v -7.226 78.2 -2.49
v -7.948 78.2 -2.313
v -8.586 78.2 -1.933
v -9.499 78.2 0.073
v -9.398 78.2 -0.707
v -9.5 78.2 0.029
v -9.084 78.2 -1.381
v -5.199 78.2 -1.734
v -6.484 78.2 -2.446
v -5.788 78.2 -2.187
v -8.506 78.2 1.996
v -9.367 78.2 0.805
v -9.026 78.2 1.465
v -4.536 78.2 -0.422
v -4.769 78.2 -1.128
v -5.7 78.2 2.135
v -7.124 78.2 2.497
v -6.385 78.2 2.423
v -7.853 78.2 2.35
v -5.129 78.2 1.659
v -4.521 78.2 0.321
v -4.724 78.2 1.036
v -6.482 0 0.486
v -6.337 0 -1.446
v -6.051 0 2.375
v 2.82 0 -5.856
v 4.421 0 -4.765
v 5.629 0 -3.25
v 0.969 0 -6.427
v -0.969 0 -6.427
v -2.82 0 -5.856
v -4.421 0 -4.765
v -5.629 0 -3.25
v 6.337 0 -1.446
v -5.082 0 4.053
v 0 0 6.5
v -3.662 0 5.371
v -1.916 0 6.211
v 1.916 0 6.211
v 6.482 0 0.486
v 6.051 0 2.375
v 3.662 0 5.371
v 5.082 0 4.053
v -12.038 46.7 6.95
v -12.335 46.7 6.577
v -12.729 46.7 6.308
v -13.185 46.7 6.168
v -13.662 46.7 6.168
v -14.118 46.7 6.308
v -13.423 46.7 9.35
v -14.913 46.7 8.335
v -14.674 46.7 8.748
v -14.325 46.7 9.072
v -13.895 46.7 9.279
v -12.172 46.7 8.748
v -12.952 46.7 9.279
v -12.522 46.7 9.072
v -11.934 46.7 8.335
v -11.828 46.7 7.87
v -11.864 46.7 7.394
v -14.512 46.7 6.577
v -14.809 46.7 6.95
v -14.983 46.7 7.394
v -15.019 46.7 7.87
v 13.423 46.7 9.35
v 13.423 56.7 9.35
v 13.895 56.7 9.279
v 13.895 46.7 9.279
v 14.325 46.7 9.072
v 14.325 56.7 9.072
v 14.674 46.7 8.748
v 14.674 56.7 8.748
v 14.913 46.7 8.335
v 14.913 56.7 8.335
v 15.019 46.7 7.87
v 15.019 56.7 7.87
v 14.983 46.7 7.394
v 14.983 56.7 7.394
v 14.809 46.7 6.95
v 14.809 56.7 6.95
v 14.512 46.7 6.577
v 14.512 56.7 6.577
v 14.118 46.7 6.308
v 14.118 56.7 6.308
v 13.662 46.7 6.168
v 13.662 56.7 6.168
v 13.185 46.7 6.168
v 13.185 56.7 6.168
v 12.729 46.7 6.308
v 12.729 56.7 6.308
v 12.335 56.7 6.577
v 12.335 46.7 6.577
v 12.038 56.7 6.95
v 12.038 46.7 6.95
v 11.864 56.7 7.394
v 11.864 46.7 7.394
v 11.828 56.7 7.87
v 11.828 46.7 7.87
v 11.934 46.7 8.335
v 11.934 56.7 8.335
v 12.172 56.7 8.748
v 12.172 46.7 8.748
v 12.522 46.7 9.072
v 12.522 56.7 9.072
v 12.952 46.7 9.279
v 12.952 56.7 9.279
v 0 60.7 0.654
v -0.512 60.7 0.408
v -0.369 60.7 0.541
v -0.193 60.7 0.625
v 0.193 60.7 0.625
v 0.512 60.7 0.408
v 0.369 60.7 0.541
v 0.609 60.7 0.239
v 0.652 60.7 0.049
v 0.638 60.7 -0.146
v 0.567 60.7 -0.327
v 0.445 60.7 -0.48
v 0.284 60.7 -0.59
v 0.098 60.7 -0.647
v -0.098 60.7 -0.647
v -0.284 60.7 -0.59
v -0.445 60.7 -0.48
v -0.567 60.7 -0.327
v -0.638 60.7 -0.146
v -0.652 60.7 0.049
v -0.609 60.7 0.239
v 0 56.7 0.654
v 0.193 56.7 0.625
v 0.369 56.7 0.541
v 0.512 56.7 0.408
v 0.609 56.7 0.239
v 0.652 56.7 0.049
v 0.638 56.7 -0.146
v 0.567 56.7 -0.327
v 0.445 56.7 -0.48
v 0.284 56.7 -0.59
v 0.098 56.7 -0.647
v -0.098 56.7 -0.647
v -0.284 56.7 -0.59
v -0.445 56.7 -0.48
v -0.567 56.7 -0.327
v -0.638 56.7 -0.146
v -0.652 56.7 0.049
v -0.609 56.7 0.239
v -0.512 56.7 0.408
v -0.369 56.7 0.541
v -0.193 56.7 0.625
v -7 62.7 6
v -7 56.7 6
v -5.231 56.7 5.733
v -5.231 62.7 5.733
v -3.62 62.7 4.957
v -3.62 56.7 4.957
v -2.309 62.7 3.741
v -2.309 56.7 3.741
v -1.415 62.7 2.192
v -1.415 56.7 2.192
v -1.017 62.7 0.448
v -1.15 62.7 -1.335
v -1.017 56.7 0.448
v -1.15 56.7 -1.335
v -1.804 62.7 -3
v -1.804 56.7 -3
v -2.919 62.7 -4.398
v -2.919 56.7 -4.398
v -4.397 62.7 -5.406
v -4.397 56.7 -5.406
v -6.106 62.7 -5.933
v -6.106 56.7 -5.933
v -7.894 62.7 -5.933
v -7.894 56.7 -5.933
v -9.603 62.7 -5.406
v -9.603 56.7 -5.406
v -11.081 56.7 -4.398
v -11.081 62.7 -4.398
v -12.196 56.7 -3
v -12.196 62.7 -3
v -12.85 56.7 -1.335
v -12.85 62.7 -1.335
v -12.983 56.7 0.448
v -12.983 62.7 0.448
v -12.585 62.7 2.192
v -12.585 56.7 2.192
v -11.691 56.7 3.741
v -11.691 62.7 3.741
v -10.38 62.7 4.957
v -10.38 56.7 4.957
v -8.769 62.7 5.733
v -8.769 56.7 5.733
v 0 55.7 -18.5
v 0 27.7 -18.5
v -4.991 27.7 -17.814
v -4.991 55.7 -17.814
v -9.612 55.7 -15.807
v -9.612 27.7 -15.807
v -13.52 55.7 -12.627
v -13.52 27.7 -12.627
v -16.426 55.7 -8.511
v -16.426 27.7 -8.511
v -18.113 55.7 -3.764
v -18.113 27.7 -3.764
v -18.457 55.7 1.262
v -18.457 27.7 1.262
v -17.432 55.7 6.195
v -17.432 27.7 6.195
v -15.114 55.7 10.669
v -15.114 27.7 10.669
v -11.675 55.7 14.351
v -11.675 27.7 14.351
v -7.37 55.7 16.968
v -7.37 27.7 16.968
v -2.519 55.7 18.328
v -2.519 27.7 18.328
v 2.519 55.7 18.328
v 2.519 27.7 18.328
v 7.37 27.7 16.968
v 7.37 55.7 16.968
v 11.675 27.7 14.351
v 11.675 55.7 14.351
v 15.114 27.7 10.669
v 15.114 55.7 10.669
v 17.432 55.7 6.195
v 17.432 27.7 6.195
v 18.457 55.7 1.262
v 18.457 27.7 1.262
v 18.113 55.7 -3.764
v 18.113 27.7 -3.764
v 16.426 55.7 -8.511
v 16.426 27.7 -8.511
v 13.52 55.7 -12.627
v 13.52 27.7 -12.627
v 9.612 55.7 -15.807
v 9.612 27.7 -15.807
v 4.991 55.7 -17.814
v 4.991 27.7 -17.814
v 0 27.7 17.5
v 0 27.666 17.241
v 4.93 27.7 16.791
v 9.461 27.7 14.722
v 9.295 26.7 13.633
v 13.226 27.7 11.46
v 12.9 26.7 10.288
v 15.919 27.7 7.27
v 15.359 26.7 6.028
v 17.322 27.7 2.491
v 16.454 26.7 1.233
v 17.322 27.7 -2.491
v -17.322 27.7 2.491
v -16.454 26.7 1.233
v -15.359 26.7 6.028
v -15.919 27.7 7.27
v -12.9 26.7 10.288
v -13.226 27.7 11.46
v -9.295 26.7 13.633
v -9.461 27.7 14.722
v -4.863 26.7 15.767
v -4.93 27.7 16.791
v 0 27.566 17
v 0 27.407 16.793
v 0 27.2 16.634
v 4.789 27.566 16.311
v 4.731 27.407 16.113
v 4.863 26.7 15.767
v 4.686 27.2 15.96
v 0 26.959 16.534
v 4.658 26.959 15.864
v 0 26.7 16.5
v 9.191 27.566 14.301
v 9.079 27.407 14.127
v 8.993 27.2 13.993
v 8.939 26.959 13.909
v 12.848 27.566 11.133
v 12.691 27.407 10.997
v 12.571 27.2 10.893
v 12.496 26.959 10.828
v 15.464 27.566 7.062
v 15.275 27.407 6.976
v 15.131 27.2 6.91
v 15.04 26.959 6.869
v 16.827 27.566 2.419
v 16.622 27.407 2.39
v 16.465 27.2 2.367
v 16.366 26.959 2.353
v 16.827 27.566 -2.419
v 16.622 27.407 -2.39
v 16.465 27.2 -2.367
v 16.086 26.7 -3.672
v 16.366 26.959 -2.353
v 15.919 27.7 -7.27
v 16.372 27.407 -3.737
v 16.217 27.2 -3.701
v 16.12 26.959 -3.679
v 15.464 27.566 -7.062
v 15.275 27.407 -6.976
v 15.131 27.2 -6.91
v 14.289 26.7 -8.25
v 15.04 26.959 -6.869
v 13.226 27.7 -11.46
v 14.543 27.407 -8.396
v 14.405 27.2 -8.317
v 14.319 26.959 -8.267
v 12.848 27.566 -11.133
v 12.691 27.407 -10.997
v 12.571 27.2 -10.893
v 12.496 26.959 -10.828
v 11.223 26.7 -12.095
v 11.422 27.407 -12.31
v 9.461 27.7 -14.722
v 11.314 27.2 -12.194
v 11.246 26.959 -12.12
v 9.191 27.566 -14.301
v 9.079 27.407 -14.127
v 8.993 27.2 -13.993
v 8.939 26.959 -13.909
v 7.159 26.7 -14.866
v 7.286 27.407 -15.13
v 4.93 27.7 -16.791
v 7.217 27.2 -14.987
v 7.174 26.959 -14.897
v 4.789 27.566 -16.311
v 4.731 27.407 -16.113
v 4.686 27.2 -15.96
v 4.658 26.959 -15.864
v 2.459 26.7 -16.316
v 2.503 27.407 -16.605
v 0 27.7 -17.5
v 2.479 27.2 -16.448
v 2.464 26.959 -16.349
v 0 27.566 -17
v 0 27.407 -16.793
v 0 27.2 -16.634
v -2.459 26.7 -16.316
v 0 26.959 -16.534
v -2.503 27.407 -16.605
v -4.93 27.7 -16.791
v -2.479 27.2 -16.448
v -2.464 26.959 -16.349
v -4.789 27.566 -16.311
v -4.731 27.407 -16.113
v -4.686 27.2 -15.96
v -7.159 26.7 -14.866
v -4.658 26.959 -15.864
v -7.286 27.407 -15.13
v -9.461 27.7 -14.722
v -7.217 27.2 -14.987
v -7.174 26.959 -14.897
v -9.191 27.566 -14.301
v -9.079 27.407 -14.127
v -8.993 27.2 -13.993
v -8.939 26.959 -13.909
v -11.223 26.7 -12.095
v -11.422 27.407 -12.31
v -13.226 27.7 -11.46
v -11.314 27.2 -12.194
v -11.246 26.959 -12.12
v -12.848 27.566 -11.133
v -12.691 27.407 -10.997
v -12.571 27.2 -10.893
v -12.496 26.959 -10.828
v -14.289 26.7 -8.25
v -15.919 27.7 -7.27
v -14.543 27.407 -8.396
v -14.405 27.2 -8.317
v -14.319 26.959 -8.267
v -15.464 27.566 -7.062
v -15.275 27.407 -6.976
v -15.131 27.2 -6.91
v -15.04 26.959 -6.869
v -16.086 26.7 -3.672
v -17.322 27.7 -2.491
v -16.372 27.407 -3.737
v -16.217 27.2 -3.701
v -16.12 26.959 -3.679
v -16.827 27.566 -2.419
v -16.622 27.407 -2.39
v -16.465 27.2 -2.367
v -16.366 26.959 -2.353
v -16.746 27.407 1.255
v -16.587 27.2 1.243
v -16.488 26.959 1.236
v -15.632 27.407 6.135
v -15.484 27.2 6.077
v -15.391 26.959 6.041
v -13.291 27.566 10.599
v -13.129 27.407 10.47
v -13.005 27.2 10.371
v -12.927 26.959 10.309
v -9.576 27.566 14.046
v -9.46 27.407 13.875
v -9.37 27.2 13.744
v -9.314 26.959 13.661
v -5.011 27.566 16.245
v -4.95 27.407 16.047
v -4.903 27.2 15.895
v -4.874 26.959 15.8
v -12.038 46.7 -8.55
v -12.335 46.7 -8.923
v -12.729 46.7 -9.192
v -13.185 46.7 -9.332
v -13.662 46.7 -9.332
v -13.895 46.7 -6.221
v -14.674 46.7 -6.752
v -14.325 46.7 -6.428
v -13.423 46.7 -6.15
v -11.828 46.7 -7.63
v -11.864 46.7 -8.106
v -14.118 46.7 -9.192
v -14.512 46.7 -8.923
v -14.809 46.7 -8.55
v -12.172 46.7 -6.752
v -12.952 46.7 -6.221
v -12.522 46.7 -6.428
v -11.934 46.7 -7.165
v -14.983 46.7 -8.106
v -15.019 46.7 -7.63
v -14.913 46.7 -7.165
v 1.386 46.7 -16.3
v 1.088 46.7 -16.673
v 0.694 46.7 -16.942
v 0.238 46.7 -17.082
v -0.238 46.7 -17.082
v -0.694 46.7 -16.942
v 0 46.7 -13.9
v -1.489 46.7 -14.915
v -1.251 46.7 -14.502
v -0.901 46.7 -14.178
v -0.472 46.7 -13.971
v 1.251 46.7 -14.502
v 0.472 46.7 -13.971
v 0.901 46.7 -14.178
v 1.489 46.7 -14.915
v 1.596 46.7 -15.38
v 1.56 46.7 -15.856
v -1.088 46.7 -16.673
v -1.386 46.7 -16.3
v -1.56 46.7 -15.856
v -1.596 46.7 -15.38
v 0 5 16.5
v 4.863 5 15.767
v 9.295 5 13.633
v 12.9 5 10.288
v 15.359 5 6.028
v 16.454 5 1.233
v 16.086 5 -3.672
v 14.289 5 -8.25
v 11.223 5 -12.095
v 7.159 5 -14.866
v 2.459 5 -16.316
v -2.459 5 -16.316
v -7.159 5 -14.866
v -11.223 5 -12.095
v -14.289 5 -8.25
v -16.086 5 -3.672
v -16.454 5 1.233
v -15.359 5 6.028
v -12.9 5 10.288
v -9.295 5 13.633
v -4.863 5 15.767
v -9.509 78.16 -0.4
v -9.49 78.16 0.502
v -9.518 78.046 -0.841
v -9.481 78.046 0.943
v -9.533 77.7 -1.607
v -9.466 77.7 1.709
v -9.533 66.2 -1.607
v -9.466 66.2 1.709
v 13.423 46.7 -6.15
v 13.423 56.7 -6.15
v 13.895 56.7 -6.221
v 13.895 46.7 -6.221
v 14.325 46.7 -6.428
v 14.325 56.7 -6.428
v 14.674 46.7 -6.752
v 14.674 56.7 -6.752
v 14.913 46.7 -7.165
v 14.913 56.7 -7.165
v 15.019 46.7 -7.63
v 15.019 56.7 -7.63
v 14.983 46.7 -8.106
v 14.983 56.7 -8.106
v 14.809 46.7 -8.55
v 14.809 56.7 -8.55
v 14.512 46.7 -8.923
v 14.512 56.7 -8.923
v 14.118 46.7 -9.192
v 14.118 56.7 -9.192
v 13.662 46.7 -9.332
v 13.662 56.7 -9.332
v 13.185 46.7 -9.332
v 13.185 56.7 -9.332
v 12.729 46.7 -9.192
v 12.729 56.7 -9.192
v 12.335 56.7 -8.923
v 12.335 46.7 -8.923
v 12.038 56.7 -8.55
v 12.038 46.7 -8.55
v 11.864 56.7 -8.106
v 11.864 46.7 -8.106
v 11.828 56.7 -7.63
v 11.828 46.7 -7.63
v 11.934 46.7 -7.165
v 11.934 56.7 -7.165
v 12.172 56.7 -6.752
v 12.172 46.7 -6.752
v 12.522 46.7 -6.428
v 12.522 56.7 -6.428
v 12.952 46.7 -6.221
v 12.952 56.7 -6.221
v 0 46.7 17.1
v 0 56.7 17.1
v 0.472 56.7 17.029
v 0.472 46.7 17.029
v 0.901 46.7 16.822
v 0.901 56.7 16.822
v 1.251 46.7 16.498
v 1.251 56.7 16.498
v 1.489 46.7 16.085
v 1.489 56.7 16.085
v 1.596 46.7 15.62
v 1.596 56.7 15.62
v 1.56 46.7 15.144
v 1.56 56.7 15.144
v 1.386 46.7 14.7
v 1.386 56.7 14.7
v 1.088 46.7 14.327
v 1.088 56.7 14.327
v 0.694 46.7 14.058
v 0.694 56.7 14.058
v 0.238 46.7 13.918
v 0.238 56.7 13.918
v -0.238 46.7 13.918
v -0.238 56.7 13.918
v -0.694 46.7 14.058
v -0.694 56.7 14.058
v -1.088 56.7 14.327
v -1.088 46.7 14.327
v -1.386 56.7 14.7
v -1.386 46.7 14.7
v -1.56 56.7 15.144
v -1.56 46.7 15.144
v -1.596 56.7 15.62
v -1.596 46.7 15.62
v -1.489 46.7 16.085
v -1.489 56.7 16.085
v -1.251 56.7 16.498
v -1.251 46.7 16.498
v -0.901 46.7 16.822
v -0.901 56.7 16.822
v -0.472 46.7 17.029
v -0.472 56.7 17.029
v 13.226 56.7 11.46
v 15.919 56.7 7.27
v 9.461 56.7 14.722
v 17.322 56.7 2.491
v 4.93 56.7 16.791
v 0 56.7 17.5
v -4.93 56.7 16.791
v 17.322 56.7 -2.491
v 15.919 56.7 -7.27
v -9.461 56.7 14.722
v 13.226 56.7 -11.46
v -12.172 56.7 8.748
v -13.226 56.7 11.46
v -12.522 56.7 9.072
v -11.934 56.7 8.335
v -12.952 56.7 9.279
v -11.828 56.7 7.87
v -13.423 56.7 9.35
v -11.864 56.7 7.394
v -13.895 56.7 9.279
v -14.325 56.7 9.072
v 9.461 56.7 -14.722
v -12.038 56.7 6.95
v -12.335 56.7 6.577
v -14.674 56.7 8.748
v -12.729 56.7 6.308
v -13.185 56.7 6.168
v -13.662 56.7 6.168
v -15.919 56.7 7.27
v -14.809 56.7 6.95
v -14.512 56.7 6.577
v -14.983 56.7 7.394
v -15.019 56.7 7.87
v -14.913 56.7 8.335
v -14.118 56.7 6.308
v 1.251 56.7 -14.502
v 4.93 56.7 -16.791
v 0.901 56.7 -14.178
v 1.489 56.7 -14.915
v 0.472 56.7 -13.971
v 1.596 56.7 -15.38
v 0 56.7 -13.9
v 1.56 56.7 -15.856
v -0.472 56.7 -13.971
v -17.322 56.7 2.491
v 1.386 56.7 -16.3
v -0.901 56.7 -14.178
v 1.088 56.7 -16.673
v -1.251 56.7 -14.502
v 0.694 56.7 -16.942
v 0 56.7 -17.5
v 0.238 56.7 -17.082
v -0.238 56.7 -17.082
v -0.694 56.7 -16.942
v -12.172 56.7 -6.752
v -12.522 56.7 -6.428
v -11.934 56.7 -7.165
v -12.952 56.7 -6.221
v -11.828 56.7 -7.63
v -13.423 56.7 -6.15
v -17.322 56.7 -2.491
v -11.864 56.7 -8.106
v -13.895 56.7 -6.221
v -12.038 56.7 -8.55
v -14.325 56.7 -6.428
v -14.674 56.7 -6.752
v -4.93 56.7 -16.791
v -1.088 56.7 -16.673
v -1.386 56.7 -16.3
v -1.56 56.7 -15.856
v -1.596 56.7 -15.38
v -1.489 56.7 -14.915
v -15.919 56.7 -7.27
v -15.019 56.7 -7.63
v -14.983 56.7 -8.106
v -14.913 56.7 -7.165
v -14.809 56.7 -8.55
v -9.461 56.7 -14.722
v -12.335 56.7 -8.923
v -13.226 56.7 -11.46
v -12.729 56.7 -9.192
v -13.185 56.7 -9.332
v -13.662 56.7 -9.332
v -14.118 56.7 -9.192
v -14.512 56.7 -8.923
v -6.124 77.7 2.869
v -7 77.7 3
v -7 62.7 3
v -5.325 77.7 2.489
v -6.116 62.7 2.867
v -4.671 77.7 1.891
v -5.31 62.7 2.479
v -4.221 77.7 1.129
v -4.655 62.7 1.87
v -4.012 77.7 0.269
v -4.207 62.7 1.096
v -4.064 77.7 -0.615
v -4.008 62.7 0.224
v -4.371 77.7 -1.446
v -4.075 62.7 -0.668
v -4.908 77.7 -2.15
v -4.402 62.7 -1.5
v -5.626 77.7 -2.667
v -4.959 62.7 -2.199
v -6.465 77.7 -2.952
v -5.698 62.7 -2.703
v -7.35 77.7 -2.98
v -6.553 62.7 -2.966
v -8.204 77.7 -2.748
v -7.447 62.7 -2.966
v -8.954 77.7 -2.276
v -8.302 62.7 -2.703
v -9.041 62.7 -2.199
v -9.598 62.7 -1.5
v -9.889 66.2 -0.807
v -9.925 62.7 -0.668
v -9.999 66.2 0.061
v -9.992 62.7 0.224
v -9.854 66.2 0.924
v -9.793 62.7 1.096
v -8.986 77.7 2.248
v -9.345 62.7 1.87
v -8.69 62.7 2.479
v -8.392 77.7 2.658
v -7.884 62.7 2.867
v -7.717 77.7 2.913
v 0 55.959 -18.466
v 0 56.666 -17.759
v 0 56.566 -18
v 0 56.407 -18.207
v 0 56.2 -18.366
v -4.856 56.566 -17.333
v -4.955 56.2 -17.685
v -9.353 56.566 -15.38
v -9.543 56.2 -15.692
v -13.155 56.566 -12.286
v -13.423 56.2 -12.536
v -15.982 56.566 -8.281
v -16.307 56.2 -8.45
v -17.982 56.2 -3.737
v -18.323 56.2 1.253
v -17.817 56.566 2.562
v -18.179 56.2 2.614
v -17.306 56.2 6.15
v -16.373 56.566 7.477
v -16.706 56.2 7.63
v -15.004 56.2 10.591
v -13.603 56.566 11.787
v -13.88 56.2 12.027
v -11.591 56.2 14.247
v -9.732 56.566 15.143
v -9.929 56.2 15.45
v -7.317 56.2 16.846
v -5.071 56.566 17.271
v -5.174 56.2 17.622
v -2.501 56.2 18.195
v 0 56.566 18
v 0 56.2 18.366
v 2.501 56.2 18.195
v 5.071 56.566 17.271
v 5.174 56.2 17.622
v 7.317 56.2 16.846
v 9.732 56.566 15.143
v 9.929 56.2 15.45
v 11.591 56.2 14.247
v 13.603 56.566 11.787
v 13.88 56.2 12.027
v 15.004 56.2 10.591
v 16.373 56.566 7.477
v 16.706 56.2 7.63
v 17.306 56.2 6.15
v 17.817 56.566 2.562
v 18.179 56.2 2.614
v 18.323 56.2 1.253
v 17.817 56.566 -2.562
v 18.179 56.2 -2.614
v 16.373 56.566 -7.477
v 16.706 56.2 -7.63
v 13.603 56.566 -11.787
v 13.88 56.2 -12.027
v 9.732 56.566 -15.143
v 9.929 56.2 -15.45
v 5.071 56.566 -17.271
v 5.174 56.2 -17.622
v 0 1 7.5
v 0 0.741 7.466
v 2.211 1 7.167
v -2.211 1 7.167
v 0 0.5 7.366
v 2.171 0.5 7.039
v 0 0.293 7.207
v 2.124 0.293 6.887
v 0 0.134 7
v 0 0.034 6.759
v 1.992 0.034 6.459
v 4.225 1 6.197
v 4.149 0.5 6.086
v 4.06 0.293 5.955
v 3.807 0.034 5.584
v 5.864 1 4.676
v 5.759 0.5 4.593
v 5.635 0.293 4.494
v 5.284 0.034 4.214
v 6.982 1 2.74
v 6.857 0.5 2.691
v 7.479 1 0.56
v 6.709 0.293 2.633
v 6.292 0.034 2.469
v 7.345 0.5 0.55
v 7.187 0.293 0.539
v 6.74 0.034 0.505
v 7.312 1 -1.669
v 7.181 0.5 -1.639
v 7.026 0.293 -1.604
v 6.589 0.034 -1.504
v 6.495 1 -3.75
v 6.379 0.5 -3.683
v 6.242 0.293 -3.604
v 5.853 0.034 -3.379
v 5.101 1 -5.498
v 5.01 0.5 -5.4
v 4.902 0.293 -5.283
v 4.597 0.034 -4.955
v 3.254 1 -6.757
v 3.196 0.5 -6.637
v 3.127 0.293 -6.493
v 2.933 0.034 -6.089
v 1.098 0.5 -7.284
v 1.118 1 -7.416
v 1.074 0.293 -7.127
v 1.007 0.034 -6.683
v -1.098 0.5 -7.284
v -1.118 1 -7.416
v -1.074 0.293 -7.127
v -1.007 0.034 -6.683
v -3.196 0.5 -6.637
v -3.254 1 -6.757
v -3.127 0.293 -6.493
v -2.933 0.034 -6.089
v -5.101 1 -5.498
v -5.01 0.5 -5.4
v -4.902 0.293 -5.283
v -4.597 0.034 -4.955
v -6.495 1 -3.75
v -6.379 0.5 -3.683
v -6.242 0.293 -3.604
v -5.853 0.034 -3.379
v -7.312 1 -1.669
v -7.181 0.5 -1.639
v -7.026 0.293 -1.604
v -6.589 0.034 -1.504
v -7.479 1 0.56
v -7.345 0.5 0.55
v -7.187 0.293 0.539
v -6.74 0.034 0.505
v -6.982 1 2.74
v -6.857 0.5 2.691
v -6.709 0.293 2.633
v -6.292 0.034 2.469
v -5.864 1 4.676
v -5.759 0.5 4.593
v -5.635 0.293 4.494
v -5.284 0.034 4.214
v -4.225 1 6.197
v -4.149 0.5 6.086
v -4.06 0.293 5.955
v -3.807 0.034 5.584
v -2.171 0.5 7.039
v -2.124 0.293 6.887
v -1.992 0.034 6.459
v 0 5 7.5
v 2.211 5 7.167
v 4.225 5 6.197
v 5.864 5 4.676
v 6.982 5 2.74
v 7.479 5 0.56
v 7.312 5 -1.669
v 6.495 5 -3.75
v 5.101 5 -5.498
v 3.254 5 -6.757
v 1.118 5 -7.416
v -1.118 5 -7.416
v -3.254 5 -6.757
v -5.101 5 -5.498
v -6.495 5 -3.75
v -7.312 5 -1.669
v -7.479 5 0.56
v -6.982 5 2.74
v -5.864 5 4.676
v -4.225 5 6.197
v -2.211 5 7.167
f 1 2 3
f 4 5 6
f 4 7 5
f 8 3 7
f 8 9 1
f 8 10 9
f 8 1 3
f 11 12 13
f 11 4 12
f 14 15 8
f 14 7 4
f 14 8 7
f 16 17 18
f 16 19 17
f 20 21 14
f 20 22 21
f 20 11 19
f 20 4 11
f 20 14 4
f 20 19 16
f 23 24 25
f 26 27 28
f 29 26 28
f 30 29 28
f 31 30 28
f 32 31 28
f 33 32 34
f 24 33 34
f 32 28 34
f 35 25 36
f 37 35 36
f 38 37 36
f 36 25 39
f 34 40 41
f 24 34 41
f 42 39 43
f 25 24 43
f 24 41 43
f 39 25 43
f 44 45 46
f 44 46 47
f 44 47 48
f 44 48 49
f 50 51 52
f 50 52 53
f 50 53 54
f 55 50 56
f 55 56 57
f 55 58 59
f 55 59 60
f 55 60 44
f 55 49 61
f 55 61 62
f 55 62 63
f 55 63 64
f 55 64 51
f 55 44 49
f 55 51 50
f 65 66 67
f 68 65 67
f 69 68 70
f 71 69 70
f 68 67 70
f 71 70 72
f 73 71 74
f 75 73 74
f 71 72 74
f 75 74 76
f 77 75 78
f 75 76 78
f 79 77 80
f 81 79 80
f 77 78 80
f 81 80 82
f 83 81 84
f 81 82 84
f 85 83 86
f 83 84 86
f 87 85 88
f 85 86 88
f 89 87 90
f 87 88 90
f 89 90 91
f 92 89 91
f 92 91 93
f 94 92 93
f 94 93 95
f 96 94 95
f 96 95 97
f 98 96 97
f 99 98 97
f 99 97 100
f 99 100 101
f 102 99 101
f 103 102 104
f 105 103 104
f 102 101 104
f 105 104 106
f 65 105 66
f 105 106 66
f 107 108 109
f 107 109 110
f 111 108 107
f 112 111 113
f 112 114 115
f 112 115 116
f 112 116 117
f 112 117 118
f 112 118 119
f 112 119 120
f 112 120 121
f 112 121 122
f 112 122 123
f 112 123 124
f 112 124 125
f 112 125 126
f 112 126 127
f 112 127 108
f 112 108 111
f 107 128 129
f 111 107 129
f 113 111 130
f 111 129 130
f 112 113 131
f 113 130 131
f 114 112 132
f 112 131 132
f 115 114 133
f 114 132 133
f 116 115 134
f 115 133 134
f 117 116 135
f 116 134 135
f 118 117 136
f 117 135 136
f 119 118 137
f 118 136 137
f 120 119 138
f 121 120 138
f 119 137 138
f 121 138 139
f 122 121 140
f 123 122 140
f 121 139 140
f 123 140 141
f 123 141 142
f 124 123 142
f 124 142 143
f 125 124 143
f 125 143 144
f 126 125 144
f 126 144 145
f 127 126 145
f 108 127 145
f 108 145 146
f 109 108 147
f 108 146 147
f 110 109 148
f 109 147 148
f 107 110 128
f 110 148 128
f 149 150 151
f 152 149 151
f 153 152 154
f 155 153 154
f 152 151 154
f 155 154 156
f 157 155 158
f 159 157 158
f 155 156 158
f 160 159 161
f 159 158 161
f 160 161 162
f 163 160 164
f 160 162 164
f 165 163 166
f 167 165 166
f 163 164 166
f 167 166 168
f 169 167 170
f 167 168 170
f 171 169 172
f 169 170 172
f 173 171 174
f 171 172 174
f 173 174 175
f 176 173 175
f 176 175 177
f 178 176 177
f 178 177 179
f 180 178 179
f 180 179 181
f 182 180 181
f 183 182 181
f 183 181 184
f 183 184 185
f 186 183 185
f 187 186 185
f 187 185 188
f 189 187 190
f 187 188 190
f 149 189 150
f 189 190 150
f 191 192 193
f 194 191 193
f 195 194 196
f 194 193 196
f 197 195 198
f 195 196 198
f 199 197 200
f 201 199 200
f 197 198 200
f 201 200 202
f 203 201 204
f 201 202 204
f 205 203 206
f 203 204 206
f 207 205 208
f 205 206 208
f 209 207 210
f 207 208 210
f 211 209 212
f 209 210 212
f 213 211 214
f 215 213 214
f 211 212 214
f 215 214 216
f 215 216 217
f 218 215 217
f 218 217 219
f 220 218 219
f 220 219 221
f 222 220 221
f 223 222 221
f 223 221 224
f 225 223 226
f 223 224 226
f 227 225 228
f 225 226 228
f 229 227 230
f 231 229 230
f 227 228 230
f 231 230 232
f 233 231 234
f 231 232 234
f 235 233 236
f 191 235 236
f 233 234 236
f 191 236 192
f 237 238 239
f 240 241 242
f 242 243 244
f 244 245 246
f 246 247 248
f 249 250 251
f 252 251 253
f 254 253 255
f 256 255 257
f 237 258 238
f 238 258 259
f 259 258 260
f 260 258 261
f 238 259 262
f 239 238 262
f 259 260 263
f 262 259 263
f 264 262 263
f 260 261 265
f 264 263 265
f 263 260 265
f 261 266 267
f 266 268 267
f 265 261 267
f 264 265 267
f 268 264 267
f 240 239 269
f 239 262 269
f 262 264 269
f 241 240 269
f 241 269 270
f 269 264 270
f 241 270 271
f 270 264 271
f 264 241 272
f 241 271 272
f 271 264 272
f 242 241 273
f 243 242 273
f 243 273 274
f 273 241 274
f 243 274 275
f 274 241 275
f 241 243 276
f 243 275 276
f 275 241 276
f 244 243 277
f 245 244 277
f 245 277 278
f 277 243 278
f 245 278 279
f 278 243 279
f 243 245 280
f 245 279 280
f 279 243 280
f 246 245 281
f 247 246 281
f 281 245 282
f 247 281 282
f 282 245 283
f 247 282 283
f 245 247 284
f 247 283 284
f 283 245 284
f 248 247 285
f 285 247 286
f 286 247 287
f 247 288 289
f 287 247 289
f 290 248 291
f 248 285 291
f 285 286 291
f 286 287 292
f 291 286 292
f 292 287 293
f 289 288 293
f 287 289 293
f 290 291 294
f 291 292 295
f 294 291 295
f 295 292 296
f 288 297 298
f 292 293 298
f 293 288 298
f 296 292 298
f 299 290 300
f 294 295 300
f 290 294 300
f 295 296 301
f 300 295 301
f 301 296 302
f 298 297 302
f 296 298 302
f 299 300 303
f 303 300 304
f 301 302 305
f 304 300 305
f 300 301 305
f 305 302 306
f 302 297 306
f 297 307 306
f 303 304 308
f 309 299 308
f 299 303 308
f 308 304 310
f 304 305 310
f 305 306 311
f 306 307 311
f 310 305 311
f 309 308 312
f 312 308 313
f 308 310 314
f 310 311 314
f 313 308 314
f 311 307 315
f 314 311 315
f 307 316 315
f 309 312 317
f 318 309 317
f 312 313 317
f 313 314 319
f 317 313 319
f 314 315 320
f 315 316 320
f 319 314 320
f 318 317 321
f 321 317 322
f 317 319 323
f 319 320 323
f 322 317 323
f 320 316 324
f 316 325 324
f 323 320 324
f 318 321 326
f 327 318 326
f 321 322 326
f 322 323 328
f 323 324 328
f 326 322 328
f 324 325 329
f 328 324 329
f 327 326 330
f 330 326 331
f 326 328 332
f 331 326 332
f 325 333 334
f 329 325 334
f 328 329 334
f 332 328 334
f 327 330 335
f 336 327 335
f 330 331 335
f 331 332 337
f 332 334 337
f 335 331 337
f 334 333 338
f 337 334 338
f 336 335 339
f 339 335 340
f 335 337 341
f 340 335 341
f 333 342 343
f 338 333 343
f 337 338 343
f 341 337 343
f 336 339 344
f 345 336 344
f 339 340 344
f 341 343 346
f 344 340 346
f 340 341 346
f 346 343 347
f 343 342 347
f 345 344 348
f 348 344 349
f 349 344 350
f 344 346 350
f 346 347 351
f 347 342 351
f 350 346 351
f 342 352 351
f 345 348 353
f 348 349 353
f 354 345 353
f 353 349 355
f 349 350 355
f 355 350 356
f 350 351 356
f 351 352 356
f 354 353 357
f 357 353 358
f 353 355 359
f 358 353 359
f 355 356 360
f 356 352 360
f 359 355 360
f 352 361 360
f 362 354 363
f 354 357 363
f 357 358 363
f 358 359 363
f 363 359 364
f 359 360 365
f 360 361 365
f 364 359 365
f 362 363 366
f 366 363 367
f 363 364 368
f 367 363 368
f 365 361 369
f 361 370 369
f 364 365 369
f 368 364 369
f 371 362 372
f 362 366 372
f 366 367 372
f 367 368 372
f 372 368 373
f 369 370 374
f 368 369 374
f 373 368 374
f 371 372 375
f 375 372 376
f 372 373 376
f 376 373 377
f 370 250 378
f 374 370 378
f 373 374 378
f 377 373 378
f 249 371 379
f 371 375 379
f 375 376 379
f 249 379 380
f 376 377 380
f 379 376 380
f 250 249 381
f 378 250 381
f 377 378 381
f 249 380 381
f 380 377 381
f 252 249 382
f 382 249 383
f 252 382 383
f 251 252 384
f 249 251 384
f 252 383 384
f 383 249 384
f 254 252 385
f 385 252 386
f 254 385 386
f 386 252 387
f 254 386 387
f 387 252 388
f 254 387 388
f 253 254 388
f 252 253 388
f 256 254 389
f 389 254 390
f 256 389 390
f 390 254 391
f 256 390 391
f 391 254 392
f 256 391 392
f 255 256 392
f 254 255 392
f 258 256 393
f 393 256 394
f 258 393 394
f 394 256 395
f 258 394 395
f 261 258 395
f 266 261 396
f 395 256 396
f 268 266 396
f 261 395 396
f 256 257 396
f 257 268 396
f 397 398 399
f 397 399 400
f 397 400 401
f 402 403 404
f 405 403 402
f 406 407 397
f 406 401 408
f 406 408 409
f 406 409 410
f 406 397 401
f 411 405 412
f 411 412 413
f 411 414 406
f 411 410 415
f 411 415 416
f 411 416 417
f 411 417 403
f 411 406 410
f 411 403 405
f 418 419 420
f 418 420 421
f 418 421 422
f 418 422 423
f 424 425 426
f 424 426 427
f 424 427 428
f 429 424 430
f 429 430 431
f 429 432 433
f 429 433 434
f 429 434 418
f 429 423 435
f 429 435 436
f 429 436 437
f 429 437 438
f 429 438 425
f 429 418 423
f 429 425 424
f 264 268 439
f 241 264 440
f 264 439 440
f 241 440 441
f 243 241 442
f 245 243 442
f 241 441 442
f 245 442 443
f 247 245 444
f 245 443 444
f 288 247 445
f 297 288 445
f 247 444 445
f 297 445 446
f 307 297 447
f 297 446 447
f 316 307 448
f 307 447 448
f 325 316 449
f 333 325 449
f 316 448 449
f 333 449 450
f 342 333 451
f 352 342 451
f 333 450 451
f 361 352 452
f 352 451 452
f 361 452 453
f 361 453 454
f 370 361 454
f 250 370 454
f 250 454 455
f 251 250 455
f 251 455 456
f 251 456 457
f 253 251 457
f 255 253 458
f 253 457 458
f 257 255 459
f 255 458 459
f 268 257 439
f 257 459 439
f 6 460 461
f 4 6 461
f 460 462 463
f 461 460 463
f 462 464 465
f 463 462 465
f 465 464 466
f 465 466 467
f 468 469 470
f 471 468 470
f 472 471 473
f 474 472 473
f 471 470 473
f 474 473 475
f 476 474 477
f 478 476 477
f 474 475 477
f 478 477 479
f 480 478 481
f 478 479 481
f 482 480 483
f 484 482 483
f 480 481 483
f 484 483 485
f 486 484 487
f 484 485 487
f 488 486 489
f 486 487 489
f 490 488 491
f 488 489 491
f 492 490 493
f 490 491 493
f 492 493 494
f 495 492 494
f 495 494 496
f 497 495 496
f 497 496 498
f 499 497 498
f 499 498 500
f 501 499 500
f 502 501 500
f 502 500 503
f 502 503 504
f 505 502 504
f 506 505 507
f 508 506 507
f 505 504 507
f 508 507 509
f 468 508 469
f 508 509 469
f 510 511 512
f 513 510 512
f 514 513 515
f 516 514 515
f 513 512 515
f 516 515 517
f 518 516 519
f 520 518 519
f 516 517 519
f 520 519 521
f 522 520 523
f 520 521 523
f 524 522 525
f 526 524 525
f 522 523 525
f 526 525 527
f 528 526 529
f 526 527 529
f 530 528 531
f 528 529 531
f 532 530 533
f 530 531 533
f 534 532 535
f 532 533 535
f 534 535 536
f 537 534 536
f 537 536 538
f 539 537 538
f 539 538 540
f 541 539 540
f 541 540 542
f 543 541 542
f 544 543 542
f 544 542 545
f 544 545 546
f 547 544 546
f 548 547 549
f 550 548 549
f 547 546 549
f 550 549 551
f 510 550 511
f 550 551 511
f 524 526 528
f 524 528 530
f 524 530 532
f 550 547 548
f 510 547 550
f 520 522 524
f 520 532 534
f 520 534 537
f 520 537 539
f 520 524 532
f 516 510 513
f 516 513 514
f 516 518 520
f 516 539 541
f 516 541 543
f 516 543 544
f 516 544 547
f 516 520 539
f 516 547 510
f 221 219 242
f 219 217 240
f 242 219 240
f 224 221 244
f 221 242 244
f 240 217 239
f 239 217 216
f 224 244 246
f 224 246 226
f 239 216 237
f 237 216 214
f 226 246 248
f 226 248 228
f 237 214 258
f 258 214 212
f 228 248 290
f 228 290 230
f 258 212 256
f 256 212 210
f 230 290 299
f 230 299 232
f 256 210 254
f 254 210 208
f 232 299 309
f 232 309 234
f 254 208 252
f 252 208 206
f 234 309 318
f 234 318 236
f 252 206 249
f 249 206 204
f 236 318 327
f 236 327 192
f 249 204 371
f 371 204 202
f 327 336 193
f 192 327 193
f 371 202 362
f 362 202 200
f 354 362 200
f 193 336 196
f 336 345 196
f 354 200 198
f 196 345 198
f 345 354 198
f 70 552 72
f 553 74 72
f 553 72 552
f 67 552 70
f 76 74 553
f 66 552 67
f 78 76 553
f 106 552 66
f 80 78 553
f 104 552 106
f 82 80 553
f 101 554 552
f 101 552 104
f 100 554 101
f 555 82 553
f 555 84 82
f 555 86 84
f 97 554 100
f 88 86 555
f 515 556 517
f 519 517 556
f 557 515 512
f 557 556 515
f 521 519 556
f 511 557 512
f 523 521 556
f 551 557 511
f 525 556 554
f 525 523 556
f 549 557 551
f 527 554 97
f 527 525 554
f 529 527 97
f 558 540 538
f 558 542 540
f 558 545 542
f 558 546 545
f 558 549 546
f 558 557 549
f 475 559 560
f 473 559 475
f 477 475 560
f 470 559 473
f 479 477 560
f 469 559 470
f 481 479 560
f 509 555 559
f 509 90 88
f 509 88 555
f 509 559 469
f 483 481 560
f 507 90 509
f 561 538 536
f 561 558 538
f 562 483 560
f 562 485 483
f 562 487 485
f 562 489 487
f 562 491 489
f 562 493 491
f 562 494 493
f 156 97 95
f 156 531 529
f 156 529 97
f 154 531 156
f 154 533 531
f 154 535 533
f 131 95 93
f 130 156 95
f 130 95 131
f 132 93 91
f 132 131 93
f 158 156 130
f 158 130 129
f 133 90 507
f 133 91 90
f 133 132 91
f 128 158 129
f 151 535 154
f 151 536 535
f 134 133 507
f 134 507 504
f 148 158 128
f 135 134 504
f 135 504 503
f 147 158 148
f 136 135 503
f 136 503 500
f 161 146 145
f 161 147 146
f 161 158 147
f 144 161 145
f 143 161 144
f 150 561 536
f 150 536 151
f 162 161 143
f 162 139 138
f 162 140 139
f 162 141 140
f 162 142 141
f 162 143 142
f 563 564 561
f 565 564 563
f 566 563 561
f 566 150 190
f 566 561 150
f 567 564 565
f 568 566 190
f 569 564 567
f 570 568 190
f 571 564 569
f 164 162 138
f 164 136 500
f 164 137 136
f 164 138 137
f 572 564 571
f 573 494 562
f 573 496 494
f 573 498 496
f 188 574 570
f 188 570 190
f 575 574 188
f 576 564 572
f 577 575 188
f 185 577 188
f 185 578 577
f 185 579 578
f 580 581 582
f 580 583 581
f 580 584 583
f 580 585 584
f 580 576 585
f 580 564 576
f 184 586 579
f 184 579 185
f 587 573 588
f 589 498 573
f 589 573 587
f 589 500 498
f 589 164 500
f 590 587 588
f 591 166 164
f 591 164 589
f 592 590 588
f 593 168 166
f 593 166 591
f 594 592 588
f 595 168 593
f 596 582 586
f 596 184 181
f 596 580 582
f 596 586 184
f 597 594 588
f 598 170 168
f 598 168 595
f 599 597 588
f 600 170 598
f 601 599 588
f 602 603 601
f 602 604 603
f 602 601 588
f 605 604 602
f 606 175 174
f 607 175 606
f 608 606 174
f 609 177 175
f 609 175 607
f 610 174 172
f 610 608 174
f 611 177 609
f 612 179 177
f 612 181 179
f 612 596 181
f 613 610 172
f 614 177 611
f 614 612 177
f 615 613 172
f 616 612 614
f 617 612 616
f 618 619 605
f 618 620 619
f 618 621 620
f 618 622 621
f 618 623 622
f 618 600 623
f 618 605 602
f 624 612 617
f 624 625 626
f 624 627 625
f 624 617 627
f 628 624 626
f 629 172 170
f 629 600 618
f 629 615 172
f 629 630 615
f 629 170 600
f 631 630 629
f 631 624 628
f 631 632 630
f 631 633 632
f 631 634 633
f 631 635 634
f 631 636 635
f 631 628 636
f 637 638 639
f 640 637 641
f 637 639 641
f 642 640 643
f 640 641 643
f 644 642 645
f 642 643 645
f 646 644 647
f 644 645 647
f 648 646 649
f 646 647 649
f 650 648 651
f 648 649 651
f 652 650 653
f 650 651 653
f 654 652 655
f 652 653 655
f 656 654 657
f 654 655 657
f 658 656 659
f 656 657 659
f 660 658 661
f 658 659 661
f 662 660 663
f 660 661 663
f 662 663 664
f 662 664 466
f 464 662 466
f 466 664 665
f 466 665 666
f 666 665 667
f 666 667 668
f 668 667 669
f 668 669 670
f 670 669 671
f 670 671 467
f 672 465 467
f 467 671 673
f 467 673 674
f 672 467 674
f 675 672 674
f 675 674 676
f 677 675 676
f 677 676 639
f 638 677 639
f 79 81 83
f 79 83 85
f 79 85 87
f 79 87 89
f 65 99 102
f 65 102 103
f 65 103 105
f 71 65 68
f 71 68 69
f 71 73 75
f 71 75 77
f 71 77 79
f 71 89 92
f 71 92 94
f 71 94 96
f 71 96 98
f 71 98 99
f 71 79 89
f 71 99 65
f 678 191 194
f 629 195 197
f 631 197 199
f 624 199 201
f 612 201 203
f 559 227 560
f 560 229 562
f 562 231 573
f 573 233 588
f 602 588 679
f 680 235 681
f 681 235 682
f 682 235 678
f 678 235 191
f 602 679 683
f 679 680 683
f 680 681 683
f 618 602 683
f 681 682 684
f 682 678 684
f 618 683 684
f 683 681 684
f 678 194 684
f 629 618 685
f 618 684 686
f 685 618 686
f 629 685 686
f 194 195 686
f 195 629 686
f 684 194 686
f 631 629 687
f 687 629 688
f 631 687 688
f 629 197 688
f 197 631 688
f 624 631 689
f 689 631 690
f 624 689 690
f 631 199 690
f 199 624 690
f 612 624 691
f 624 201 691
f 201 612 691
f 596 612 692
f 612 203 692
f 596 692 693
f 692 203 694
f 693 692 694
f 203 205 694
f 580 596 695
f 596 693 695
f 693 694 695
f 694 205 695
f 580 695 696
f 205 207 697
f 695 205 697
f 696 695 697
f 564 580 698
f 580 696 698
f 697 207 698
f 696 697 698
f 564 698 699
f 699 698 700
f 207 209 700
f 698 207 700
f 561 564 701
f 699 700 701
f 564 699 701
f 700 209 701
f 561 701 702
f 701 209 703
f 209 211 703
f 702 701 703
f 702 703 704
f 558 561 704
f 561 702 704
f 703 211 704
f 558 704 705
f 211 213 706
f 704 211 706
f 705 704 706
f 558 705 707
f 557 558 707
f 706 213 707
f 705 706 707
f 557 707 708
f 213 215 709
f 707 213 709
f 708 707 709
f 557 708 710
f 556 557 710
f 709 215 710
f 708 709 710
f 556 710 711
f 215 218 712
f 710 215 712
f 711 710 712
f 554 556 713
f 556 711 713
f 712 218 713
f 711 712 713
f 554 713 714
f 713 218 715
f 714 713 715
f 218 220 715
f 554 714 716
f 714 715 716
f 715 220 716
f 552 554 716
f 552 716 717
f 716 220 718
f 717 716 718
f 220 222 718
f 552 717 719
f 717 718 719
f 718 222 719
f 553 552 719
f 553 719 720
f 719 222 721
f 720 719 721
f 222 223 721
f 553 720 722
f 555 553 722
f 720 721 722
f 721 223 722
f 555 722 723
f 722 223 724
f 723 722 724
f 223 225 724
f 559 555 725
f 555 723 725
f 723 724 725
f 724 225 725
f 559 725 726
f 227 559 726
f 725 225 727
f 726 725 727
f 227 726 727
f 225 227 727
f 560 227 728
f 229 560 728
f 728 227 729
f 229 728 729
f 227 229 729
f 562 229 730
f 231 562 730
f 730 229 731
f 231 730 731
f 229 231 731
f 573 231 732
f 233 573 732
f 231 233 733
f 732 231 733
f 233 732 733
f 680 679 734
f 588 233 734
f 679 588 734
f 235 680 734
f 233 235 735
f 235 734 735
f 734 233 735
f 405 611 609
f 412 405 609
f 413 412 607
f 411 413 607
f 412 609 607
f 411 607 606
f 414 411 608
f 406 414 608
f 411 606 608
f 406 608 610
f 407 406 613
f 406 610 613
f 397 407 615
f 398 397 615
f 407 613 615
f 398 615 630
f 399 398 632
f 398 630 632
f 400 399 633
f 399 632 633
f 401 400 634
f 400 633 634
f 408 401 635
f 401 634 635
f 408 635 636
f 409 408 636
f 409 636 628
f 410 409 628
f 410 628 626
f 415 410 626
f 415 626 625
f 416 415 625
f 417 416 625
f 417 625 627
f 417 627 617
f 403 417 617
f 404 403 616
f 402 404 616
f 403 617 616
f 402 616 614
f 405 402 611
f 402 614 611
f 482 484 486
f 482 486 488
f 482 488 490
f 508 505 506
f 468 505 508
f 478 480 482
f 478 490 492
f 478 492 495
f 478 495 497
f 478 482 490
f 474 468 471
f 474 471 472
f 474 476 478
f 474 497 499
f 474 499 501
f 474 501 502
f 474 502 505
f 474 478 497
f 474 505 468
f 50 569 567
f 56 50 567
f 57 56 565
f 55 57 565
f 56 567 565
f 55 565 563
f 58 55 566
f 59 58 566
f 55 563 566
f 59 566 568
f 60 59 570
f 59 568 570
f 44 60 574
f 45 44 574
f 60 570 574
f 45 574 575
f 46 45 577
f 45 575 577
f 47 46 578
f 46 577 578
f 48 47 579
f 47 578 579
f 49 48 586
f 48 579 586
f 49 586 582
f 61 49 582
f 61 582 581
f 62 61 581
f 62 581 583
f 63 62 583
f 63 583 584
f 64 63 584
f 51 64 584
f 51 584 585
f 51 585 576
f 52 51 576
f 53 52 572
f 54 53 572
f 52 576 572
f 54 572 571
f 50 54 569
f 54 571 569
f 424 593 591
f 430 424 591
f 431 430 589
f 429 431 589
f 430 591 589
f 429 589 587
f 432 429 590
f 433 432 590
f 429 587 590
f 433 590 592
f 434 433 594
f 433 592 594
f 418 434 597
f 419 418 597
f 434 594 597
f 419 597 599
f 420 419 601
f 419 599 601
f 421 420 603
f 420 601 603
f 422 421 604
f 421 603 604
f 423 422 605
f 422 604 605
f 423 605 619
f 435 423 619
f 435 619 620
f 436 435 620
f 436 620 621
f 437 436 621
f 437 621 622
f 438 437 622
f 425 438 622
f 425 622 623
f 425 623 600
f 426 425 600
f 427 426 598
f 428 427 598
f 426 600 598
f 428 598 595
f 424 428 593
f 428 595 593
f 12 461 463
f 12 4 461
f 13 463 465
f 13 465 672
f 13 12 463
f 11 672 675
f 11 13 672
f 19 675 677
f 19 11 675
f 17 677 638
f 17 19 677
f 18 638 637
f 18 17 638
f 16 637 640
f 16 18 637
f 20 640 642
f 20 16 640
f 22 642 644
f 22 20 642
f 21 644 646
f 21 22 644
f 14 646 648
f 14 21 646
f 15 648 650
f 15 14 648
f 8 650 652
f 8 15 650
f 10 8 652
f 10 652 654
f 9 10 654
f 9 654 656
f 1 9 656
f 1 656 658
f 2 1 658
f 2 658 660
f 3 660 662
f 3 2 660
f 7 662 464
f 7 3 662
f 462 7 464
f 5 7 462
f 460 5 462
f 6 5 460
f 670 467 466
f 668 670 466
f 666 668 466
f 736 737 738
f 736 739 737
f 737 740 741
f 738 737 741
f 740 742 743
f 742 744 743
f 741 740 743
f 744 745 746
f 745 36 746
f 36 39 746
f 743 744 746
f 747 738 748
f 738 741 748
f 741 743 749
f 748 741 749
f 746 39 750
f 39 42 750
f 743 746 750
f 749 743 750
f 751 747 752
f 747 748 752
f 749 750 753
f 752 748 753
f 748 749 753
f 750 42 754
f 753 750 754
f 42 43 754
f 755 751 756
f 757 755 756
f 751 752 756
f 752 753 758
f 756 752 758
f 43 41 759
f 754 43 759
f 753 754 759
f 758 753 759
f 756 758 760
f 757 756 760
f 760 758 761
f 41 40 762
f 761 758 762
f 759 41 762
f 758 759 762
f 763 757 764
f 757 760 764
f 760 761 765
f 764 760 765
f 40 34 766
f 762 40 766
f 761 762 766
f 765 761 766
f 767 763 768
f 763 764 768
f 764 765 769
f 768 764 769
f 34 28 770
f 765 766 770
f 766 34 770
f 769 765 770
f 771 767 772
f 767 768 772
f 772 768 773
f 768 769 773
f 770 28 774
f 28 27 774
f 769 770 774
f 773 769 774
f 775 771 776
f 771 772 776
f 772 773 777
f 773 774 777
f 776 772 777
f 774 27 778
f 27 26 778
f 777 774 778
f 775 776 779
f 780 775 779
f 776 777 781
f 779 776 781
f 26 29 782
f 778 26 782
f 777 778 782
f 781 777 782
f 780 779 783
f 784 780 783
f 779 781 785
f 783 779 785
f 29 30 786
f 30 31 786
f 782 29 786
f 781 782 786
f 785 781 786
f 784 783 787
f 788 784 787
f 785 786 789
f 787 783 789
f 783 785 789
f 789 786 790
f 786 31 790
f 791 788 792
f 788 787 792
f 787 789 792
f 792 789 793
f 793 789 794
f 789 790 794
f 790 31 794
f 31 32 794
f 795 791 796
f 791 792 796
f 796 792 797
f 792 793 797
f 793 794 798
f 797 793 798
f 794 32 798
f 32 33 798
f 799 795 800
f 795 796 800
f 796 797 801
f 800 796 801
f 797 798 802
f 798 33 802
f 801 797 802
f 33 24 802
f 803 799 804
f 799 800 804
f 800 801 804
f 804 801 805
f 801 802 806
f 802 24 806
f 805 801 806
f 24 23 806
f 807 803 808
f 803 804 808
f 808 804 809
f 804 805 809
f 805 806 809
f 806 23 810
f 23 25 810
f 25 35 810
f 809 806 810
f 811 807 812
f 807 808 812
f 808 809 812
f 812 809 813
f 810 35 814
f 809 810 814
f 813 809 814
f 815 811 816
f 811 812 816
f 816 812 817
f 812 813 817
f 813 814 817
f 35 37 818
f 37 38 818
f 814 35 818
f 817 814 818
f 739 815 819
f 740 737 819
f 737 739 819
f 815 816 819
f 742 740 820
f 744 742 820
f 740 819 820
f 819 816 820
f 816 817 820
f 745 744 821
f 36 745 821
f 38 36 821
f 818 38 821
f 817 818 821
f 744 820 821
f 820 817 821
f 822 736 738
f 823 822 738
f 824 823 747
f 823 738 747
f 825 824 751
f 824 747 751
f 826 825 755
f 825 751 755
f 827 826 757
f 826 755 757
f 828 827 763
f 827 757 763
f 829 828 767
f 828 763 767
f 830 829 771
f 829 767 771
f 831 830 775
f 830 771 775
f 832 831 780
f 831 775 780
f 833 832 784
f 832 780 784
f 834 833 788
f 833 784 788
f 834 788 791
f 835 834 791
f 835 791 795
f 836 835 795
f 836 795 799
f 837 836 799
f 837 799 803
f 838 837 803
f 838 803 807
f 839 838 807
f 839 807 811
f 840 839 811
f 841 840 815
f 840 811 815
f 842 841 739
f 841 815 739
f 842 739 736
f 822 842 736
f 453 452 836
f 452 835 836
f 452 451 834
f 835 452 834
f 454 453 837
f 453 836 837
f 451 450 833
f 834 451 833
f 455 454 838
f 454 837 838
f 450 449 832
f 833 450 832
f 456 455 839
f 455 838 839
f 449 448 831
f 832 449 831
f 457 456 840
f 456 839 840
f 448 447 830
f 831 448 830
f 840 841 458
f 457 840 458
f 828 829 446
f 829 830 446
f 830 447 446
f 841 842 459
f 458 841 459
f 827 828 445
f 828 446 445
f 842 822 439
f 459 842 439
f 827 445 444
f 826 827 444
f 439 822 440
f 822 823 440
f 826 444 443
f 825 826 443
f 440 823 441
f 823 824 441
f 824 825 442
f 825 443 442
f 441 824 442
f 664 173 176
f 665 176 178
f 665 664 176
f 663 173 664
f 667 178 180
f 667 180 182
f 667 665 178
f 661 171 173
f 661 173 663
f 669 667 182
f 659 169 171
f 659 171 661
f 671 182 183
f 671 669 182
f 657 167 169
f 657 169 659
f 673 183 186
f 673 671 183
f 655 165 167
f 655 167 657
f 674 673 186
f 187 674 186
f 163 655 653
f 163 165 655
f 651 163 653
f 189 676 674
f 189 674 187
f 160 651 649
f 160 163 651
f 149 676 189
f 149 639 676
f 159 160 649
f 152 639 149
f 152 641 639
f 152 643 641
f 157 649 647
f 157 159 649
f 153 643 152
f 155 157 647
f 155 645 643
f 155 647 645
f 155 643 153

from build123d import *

# Parameters (mm, degrees)
SKETCH_1_R          = 7.5
EXTRUDE_1_DEPTH     = 5
SKETCH_2_R          = 16.5
EXTRUDE_2_DEPTH     = 22.7
SKETCH_3_R          = 18.5
EXTRUDE_3_DEPTH     = 29
SKETCH_4_R          = 1.6
CUT_EXTRUDE_1_DEPTH = 10
SKETCH_5_R          = 6
EXTRUDE_4_DEPTH     = 6
SKETCH_6_R          = 3
EXTRUDE_5_DEPTH     = 15.5
CUT_EXTRUDE_START   = -12
CUT_EXTRUDE_2_DEPTH = 12
CHAMFER_1_SIZE      = 0.5
FILLET_1_R          = 1
FILLET_2_R          = 1
FILLET_3_R          = 1
SKETCH_8_R          = 0.654296706
EXTRUDE_6_DEPTH     = 4


with BuildPart() as part:
    # Эскиз1 → Бобышка-Вытянуть1 (new body)
    with BuildSketch(Plane(origin=(0, 0, 0), x_dir=(1, 0, 0), z_dir=(0, 1, 0))):
        with Locations(Location((0, 0, 0), (0, 0, 270))):
            Circle(SKETCH_1_R)
    extrude(amount=EXTRUDE_1_DEPTH)

    # Эскиз2 → Бобышка-Вытянуть2 (add)
    with BuildSketch(Plane(origin=(0, 5, 0), x_dir=(1, 0, 0), z_dir=(0, 1, 0))):
        with Locations(Location((0, 0, 0), (0, 0, 270))):
            Circle(SKETCH_2_R)
    extrude(amount=EXTRUDE_2_DEPTH)

    # Эскиз3 → Бобышка-Вытянуть3 (add)
    with BuildSketch(Plane(origin=(0, 27.7, 0), x_dir=(1, 0, 0), z_dir=(0, 1, 0))):
        with Locations(Location((0, 0, 0), (0, 0, 90))):
            Circle(SKETCH_3_R)
    extrude(amount=EXTRUDE_3_DEPTH)

    # Эскиз4 → Вырез-Вытянуть1 (cut)
    with BuildSketch(Plane(origin=(0, 56.7, 0), x_dir=(1, 0, 0), z_dir=(0, 1, 0))):
        with Locations(Location((0, -15.5, 0), (0, 0, 270))):
            Circle(SKETCH_4_R)
        with Locations(Location((-13.423393759, -7.75, 0), (0, 0, 270))):
            Circle(SKETCH_4_R)
        with Locations(Location((-13.423393759, 7.75, 0), (0, 0, 270))):
            Circle(SKETCH_4_R)
        with Locations(Location((0, 15.5, 0), (0, 0, 270))):
            Circle(SKETCH_4_R)
        with Locations(Location((13.423393759, 7.75, 0), (0, 0, 270))):
            Circle(SKETCH_4_R)
        with Locations(Location((13.423393759, -7.75, 0), (0, 0, 270))):
            Circle(SKETCH_4_R)
    extrude(amount=-CUT_EXTRUDE_1_DEPTH, mode=Mode.SUBTRACT)

    # Эскиз5 → Бобышка-Вытянуть4 (add)
    with BuildSketch(Plane(origin=(0, 56.7, 0), x_dir=(1, 0, 0), z_dir=(0, 1, 0))):
        with Locations(Location((-7, 0, 0), (0, 0, 270))):
            Circle(SKETCH_5_R)
    extrude(amount=EXTRUDE_4_DEPTH)

    # Эскиз6 → Бобышка-Вытянуть5 (add)
    with BuildSketch(Plane(origin=(0, 62.7, 0), x_dir=(1, 0, 0), z_dir=(0, 1, 0))):
        with Locations(Location((-7, 0, 0), (0, 0, 270))):
            Circle(SKETCH_6_R)
    extrude(amount=EXTRUDE_5_DEPTH)

    # Эскиз7 → Вырез-Вытянуть2 (cut)
    with BuildSketch(Plane(origin=(0, 78.2, 0), x_dir=(1, 0, 0), z_dir=(0, 1, 0)).offset(CUT_EXTRUDE_START)):
        with BuildLine():
            Line((-9.533328229, 1.606937486), (-9.465630062, -1.708996312))
            ThreePointArc((-9.465630062, -1.708996312), (-9.999374975, -0.061235296), (-9.533328229, 1.606937486))
        make_face()
    extrude(amount=CUT_EXTRUDE_2_DEPTH, mode=Mode.SUBTRACT)

    # Фаска1
    chamfer_1_edges = [part.edges().sort_by_distance(p)[0] for p in [
        (-4.371234847, 78.2, -1.445542725),
    ]]
    chamfer(chamfer_1_edges, length=CHAMFER_1_SIZE - 0.0001)  # a hair under: the kernel refuses the full size

    # Скругление1
    fillet_1_edges = [part.edges().sort_by_distance(p)[0] for p in [
        (0, 56.7, 18.5),
    ]]
    fillet(fillet_1_edges, radius=FILLET_1_R)

    # Скругление2
    fillet_2_edges = [part.edges().sort_by_distance(p)[0] for p in [
        (0, 27.7, -16.5),
    ]]
    fillet(fillet_2_edges, radius=FILLET_2_R)

    # Скругление3
    fillet_3_edges = [part.edges().sort_by_distance(p)[0] for p in [
        (0, 0, -7.5),
    ]]
    fillet(fillet_3_edges, radius=FILLET_3_R)

    # Эскиз8 → Бобышка-Вытянуть6 (add)
    with BuildSketch(Plane(origin=(0, 56.7, 0), x_dir=(1, 0, 0), z_dir=(0, 1, 0))):
        with Locations(Location((0, 0, 0), (0, 0, 270))):
            Circle(SKETCH_8_R)
    extrude(amount=EXTRUDE_6_DEPTH)


solid = part.part
